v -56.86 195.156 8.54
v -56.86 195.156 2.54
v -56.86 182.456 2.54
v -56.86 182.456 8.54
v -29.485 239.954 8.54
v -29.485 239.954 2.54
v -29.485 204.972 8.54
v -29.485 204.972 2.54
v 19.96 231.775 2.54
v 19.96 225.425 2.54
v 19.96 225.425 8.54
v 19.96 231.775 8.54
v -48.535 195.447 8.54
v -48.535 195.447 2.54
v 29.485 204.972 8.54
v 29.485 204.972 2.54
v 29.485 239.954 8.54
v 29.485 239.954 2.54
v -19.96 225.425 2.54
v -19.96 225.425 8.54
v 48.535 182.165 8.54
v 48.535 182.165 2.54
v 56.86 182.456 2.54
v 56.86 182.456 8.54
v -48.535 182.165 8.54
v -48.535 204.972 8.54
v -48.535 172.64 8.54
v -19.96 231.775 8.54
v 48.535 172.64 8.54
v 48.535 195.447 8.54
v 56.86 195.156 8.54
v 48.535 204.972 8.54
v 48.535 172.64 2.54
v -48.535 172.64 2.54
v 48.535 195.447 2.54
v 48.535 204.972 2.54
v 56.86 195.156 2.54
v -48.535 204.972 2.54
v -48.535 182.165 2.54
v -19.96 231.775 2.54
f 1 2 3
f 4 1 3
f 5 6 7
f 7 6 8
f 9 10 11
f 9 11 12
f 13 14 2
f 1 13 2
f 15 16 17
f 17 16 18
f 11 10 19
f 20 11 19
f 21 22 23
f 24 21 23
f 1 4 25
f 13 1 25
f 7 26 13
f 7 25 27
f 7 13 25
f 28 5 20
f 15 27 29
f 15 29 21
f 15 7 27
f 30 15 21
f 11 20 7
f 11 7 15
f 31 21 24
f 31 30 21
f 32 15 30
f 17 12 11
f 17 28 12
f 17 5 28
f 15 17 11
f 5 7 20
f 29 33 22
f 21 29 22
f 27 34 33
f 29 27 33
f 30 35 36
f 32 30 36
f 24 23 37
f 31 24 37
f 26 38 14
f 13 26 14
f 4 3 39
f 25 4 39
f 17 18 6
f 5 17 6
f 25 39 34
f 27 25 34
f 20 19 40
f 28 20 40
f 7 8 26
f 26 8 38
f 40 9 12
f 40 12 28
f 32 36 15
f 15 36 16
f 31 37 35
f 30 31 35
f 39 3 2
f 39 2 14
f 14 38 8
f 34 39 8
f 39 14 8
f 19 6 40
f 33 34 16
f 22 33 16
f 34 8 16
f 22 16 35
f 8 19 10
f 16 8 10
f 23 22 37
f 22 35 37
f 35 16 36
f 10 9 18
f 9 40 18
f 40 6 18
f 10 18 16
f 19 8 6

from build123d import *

# Parameters (mm, degrees)
SKETCH1_W           = 39.920556732
SKETCH1_H           = 6.35
BOSS_EXTRUDE1_DEPTH = 6


with BuildPart() as part:
    # Sketch1 → Boss-Extrude1 (new body)
    with BuildSketch(Plane(origin=(0, 0, 2.54), x_dir=(-1, 0, 0), z_dir=(0, 0, -1))):
        Polygon((-48.535278366, 182.16527563), (-56.859833665, 182.455975506), (-56.859833665, 195.155975506), (-48.535278366, 195.446675383), (-48.535278366, 204.971675383), (-29.485278366, 204.971675383), (-29.485278366, 239.9538), (29.485278366, 239.9538), (29.485278366, 204.971675383), (48.535278366, 204.971675383), (48.535278366, 195.446675383), (56.859833665, 195.155975506), (56.859833665, 182.455975506), (48.535278366, 182.16527563), (48.535278366, 172.64027563), (-48.535278366, 172.64027563), align=None)
        with Locations((0, 228.6)):
            Rectangle(SKETCH1_W, SKETCH1_H, mode=Mode.SUBTRACT)
    extrude(amount=-BOSS_EXTRUDE1_DEPTH)


solid = part.part
